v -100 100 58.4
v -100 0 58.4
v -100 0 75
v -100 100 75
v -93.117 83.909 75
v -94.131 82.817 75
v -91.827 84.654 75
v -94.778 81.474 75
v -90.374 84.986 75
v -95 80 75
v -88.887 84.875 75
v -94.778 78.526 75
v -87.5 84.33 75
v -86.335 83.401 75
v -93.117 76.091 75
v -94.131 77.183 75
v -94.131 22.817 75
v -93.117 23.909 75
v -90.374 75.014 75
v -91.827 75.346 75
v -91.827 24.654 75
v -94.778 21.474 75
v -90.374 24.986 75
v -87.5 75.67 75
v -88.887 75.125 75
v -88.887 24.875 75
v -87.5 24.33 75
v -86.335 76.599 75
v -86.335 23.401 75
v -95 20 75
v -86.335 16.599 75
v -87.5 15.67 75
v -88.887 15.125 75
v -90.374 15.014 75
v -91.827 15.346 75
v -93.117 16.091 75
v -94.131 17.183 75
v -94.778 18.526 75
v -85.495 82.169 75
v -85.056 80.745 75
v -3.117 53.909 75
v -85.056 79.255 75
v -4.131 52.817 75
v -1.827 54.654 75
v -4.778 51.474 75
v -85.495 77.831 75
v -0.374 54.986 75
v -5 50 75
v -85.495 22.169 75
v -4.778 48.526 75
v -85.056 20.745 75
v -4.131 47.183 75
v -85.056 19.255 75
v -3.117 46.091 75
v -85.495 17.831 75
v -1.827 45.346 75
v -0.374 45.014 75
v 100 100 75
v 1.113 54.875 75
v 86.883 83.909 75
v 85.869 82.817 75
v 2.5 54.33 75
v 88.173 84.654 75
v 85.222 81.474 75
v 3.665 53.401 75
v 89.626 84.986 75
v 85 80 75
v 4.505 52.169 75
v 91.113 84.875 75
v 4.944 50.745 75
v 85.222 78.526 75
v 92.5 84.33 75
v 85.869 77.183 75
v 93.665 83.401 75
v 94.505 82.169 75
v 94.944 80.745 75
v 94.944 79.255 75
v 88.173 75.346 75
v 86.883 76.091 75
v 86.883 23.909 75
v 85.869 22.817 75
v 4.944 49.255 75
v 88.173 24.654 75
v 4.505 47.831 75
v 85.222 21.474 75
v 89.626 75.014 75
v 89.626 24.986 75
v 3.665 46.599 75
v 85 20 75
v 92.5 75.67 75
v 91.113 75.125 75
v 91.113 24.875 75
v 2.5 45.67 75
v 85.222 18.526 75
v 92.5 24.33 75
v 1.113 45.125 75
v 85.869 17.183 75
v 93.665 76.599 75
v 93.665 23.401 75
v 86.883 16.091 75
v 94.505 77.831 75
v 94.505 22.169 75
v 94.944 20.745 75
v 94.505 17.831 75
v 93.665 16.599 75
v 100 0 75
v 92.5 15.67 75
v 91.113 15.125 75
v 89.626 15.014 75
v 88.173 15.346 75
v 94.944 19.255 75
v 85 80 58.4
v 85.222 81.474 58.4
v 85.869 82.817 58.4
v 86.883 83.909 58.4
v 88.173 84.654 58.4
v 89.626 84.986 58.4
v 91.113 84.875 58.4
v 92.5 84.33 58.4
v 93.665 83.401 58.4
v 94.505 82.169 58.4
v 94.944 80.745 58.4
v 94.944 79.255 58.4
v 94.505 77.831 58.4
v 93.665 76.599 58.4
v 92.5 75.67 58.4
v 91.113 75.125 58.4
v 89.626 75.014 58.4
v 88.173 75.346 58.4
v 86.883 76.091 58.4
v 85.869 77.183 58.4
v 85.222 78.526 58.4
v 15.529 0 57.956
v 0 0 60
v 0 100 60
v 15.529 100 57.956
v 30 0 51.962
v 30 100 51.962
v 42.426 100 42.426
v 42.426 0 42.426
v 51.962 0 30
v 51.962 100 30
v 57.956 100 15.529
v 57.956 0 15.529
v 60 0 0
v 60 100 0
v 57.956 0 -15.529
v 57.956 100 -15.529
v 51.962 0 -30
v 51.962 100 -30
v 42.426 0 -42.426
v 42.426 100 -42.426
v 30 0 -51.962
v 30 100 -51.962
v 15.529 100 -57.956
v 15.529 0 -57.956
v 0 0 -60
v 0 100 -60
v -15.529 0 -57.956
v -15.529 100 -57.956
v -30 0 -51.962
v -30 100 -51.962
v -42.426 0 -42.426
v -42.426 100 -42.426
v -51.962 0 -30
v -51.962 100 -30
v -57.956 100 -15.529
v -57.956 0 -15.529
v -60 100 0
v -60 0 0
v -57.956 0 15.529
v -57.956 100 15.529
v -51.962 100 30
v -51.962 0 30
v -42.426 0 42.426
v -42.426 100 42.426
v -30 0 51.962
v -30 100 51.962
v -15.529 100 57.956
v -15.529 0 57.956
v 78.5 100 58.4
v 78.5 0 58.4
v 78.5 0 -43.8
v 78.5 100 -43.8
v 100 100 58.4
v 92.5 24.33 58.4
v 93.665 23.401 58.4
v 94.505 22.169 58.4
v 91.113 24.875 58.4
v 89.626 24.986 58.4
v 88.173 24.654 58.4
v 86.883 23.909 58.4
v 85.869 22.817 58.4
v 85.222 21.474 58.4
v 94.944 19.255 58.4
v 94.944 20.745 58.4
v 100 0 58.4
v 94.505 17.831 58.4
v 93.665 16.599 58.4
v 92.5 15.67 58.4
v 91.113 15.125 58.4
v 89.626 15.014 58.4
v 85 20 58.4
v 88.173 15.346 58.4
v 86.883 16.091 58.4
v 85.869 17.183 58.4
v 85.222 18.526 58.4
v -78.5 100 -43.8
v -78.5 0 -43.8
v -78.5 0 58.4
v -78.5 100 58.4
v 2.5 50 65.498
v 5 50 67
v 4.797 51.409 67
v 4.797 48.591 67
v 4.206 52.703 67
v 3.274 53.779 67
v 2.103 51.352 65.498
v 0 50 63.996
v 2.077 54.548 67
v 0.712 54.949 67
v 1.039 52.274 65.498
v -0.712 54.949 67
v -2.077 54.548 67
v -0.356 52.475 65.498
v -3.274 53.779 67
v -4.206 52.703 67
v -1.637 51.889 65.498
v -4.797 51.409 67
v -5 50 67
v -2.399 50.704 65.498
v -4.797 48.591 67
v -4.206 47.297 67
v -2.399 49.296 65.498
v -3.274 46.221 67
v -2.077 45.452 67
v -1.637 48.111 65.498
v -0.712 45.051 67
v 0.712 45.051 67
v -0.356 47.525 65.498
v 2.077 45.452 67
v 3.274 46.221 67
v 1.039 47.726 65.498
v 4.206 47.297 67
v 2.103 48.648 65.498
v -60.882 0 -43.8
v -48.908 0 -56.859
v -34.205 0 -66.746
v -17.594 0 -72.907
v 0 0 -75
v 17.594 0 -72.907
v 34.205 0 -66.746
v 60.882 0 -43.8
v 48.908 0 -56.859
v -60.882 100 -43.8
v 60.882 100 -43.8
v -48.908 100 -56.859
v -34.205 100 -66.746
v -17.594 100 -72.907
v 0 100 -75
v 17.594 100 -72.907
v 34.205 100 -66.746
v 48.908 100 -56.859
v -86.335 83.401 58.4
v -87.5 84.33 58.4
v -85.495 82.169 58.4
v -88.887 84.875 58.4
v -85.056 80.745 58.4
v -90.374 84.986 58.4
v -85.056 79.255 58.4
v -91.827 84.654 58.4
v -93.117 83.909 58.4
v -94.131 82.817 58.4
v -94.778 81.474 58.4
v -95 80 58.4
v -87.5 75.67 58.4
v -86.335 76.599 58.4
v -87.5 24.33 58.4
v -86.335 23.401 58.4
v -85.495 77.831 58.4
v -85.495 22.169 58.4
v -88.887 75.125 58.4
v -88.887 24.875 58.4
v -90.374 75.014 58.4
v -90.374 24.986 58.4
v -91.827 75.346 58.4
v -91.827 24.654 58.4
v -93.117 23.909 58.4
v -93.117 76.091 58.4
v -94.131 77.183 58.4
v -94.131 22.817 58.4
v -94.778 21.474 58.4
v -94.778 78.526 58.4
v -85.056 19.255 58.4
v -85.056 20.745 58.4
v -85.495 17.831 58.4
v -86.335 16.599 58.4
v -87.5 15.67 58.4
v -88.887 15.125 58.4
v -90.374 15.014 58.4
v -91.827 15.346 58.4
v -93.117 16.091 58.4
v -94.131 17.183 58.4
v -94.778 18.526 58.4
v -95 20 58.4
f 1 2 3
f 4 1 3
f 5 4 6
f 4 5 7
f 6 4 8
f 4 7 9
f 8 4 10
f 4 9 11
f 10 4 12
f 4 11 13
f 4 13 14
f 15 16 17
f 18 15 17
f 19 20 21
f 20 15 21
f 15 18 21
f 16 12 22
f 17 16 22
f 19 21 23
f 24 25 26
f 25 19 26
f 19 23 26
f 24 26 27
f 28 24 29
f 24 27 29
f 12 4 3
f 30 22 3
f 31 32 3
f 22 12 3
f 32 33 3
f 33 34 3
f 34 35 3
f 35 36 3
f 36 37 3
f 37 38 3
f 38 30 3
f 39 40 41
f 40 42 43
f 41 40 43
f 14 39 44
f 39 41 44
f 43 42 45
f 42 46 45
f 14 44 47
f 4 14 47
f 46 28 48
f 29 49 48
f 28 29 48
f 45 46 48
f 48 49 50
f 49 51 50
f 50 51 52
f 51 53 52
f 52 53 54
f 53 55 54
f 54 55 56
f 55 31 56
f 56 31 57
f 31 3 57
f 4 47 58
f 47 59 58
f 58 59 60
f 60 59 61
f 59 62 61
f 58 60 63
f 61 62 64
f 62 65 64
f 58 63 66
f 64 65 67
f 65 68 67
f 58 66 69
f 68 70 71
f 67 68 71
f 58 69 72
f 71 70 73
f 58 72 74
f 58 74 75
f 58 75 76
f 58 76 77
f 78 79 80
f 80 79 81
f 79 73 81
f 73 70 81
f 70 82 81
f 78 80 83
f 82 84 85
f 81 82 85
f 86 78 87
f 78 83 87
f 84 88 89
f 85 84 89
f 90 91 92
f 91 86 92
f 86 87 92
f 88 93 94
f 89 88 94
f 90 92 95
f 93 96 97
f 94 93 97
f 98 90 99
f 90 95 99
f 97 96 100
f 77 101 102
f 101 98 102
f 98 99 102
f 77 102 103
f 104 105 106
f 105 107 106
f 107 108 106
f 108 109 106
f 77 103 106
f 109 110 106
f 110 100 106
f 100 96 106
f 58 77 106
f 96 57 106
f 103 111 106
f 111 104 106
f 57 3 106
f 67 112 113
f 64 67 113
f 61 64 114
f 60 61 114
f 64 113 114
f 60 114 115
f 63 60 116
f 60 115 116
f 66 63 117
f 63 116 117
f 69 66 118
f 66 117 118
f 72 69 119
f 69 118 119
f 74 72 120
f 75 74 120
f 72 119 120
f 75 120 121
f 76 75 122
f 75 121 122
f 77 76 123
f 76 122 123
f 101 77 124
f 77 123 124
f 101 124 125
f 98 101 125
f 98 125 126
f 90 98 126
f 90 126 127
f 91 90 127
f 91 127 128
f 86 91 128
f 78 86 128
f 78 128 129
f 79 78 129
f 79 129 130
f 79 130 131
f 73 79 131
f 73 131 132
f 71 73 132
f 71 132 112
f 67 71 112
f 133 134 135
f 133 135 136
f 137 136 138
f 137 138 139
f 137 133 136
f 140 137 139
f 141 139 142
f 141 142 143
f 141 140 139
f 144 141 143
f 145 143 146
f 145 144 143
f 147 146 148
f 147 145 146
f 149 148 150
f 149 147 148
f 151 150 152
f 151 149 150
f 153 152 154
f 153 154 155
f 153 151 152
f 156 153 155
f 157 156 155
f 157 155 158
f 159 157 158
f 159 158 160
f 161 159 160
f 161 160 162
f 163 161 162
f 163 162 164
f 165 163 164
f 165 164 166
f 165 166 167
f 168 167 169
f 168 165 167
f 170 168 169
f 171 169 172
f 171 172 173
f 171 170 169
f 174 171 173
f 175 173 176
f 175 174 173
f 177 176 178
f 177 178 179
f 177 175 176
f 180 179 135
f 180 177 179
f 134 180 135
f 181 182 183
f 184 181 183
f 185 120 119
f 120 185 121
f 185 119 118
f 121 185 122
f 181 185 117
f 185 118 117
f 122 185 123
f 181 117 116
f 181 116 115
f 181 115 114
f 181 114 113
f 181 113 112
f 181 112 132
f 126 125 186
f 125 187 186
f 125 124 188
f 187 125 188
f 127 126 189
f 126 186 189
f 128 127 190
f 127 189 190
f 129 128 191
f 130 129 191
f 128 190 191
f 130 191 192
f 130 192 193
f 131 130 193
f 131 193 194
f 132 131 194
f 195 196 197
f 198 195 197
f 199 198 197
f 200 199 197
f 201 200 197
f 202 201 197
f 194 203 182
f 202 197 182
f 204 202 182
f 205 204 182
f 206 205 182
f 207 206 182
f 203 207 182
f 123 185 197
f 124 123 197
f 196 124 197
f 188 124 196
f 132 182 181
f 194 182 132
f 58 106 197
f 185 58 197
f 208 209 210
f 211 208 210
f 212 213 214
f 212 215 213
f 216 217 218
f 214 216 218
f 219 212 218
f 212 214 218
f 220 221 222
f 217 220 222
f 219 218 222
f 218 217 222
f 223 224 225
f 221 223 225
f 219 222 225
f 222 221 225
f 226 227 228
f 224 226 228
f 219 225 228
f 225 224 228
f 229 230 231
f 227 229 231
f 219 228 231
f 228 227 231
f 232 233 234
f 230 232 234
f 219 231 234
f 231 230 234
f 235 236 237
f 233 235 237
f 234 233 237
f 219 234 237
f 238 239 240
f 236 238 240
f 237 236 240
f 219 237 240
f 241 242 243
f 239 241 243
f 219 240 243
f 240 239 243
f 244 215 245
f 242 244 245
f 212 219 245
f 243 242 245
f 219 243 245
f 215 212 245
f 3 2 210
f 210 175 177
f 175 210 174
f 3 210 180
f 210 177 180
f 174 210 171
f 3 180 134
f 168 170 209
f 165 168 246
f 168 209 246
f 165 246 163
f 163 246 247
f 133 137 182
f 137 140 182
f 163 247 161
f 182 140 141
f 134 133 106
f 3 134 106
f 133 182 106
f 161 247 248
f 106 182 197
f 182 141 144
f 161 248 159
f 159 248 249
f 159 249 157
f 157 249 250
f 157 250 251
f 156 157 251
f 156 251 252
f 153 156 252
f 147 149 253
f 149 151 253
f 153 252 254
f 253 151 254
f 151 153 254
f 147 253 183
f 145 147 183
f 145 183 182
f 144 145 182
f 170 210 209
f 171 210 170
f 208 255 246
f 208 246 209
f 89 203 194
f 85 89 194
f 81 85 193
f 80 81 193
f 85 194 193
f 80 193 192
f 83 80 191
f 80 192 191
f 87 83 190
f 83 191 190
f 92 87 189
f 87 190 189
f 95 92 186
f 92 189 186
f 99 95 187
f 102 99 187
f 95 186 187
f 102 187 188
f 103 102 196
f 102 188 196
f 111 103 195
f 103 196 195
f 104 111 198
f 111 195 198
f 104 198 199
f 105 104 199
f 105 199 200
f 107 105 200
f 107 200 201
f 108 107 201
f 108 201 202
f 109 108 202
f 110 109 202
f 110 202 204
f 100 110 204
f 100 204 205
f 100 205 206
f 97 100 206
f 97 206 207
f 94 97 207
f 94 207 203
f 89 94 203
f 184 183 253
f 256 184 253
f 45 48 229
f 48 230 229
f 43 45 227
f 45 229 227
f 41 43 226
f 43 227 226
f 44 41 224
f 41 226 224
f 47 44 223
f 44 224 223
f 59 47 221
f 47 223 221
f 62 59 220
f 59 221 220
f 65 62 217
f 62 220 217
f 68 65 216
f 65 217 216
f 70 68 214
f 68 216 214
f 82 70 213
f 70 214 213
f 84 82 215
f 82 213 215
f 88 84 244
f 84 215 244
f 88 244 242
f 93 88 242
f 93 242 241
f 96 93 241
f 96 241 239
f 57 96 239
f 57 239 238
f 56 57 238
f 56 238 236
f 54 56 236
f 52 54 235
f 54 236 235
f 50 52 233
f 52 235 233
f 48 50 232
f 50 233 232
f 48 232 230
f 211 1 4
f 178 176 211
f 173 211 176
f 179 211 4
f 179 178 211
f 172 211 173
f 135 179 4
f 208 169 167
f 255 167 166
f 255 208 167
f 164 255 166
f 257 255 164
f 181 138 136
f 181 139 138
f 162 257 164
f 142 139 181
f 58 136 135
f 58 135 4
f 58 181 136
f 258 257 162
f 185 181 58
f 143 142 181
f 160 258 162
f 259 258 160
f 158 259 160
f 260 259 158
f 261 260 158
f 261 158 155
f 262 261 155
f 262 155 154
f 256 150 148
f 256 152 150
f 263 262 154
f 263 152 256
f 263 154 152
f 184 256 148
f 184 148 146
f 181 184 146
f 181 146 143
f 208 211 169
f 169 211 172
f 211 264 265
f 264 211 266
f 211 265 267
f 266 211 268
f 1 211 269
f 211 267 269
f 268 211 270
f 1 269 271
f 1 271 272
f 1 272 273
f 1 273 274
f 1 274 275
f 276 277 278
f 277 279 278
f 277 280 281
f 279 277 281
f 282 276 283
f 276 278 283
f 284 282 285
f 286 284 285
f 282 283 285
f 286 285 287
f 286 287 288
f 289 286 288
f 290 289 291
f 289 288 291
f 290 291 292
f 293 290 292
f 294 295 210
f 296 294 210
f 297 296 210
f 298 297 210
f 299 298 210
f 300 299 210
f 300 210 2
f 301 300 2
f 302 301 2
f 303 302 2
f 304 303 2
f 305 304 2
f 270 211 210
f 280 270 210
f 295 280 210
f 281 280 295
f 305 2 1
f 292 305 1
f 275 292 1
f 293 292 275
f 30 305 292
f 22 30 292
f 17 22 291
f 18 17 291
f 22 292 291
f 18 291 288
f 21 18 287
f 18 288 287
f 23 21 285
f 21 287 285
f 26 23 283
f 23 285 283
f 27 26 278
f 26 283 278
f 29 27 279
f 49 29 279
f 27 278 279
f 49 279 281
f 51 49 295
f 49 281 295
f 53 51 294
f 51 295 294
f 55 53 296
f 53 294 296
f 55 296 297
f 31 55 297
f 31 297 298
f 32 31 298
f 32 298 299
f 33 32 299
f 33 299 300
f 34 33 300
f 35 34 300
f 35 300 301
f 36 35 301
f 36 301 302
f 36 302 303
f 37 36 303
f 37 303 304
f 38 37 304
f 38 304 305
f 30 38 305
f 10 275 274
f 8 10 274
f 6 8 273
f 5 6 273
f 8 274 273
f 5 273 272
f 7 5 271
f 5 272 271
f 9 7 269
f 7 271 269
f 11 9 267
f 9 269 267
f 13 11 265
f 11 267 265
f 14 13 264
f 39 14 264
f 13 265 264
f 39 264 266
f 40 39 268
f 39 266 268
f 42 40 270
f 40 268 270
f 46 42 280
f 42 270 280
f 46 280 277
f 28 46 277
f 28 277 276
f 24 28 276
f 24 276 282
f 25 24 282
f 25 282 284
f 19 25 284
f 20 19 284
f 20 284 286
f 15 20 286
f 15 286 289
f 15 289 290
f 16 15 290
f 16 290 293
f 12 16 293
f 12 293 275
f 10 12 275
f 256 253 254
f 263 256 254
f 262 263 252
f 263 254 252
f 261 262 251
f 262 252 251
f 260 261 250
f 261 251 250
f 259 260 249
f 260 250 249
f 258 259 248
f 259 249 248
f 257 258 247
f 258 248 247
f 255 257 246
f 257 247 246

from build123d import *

# Parameters (mm, degrees)
SKETCH1_R                  = 60
BOSS_EXTRUDE1_DEPTH        = 100
M8_CLEARANCE_HOLE1_D       = 10
F_10_0MM_DOWEL_HOLE1_D     = 10
F_10_0MM_DOWEL_HOLE1_DEPTH = 8
F_10_0MM_DOWEL_HOLE1_TIP   = 3.004303095


with BuildPart() as part:
    # Sketch1 → Boss-Extrude1 (new body)
    with BuildSketch(Plane(origin=(0, 0, 0), x_dir=(1, 0, 0), z_dir=(0, 1, 0))):
        with BuildLine():
            Line((-100, -75), (100, -75))
            Line((100, -75), (100, -58.4))
            Line((100, -58.4), (78.5, -58.4))
            Line((78.5, -58.4), (78.5, 0))
            Line((78.5, 0), (78.5, 43.8))
            Line((78.5, 43.8), (60.881524291, 43.8))
            ThreePointArc((60.881524291, 43.8), (0, 75), (-60.881524291, 43.8))
            Line((-60.881524291, 43.8), (-78.5, 43.8))
            Line((-78.5, 43.8), (-78.5, 0))
            Line((-78.5, 0), (-78.5, -58.4))
            Line((-78.5, -58.4), (-100, -58.4))
            Line((-100, -58.4), (-100, -75))
        make_face()
        with Locations(Location((0, 0, 0), (0, 0, 270))):
            Circle(SKETCH1_R, mode=Mode.SUBTRACT)
    extrude(amount=BOSS_EXTRUDE1_DEPTH)

    # M8 Clearance Hole1 (through all)
    with Locations(Plane.XY.offset(75)):
        with Locations((-90, 80), (-90, 20), (90, 20), (90, 80)):
            Hole(M8_CLEARANCE_HOLE1_D / 2)

    # Ø10.0mm Dowel Hole1
    with Locations(Plane.XY.offset(75)):
        with Locations((0, 50)):
            Hole(F_10_0MM_DOWEL_HOLE1_D / 2, depth=F_10_0MM_DOWEL_HOLE1_DEPTH)
            with Locations((0, 0, -(F_10_0MM_DOWEL_HOLE1_DEPTH + F_10_0MM_DOWEL_HOLE1_TIP / 2))):  # 118° drill point
                Cone(0, F_10_0MM_DOWEL_HOLE1_D / 2, F_10_0MM_DOWEL_HOLE1_TIP, mode=Mode.SUBTRACT)


solid = part.part
